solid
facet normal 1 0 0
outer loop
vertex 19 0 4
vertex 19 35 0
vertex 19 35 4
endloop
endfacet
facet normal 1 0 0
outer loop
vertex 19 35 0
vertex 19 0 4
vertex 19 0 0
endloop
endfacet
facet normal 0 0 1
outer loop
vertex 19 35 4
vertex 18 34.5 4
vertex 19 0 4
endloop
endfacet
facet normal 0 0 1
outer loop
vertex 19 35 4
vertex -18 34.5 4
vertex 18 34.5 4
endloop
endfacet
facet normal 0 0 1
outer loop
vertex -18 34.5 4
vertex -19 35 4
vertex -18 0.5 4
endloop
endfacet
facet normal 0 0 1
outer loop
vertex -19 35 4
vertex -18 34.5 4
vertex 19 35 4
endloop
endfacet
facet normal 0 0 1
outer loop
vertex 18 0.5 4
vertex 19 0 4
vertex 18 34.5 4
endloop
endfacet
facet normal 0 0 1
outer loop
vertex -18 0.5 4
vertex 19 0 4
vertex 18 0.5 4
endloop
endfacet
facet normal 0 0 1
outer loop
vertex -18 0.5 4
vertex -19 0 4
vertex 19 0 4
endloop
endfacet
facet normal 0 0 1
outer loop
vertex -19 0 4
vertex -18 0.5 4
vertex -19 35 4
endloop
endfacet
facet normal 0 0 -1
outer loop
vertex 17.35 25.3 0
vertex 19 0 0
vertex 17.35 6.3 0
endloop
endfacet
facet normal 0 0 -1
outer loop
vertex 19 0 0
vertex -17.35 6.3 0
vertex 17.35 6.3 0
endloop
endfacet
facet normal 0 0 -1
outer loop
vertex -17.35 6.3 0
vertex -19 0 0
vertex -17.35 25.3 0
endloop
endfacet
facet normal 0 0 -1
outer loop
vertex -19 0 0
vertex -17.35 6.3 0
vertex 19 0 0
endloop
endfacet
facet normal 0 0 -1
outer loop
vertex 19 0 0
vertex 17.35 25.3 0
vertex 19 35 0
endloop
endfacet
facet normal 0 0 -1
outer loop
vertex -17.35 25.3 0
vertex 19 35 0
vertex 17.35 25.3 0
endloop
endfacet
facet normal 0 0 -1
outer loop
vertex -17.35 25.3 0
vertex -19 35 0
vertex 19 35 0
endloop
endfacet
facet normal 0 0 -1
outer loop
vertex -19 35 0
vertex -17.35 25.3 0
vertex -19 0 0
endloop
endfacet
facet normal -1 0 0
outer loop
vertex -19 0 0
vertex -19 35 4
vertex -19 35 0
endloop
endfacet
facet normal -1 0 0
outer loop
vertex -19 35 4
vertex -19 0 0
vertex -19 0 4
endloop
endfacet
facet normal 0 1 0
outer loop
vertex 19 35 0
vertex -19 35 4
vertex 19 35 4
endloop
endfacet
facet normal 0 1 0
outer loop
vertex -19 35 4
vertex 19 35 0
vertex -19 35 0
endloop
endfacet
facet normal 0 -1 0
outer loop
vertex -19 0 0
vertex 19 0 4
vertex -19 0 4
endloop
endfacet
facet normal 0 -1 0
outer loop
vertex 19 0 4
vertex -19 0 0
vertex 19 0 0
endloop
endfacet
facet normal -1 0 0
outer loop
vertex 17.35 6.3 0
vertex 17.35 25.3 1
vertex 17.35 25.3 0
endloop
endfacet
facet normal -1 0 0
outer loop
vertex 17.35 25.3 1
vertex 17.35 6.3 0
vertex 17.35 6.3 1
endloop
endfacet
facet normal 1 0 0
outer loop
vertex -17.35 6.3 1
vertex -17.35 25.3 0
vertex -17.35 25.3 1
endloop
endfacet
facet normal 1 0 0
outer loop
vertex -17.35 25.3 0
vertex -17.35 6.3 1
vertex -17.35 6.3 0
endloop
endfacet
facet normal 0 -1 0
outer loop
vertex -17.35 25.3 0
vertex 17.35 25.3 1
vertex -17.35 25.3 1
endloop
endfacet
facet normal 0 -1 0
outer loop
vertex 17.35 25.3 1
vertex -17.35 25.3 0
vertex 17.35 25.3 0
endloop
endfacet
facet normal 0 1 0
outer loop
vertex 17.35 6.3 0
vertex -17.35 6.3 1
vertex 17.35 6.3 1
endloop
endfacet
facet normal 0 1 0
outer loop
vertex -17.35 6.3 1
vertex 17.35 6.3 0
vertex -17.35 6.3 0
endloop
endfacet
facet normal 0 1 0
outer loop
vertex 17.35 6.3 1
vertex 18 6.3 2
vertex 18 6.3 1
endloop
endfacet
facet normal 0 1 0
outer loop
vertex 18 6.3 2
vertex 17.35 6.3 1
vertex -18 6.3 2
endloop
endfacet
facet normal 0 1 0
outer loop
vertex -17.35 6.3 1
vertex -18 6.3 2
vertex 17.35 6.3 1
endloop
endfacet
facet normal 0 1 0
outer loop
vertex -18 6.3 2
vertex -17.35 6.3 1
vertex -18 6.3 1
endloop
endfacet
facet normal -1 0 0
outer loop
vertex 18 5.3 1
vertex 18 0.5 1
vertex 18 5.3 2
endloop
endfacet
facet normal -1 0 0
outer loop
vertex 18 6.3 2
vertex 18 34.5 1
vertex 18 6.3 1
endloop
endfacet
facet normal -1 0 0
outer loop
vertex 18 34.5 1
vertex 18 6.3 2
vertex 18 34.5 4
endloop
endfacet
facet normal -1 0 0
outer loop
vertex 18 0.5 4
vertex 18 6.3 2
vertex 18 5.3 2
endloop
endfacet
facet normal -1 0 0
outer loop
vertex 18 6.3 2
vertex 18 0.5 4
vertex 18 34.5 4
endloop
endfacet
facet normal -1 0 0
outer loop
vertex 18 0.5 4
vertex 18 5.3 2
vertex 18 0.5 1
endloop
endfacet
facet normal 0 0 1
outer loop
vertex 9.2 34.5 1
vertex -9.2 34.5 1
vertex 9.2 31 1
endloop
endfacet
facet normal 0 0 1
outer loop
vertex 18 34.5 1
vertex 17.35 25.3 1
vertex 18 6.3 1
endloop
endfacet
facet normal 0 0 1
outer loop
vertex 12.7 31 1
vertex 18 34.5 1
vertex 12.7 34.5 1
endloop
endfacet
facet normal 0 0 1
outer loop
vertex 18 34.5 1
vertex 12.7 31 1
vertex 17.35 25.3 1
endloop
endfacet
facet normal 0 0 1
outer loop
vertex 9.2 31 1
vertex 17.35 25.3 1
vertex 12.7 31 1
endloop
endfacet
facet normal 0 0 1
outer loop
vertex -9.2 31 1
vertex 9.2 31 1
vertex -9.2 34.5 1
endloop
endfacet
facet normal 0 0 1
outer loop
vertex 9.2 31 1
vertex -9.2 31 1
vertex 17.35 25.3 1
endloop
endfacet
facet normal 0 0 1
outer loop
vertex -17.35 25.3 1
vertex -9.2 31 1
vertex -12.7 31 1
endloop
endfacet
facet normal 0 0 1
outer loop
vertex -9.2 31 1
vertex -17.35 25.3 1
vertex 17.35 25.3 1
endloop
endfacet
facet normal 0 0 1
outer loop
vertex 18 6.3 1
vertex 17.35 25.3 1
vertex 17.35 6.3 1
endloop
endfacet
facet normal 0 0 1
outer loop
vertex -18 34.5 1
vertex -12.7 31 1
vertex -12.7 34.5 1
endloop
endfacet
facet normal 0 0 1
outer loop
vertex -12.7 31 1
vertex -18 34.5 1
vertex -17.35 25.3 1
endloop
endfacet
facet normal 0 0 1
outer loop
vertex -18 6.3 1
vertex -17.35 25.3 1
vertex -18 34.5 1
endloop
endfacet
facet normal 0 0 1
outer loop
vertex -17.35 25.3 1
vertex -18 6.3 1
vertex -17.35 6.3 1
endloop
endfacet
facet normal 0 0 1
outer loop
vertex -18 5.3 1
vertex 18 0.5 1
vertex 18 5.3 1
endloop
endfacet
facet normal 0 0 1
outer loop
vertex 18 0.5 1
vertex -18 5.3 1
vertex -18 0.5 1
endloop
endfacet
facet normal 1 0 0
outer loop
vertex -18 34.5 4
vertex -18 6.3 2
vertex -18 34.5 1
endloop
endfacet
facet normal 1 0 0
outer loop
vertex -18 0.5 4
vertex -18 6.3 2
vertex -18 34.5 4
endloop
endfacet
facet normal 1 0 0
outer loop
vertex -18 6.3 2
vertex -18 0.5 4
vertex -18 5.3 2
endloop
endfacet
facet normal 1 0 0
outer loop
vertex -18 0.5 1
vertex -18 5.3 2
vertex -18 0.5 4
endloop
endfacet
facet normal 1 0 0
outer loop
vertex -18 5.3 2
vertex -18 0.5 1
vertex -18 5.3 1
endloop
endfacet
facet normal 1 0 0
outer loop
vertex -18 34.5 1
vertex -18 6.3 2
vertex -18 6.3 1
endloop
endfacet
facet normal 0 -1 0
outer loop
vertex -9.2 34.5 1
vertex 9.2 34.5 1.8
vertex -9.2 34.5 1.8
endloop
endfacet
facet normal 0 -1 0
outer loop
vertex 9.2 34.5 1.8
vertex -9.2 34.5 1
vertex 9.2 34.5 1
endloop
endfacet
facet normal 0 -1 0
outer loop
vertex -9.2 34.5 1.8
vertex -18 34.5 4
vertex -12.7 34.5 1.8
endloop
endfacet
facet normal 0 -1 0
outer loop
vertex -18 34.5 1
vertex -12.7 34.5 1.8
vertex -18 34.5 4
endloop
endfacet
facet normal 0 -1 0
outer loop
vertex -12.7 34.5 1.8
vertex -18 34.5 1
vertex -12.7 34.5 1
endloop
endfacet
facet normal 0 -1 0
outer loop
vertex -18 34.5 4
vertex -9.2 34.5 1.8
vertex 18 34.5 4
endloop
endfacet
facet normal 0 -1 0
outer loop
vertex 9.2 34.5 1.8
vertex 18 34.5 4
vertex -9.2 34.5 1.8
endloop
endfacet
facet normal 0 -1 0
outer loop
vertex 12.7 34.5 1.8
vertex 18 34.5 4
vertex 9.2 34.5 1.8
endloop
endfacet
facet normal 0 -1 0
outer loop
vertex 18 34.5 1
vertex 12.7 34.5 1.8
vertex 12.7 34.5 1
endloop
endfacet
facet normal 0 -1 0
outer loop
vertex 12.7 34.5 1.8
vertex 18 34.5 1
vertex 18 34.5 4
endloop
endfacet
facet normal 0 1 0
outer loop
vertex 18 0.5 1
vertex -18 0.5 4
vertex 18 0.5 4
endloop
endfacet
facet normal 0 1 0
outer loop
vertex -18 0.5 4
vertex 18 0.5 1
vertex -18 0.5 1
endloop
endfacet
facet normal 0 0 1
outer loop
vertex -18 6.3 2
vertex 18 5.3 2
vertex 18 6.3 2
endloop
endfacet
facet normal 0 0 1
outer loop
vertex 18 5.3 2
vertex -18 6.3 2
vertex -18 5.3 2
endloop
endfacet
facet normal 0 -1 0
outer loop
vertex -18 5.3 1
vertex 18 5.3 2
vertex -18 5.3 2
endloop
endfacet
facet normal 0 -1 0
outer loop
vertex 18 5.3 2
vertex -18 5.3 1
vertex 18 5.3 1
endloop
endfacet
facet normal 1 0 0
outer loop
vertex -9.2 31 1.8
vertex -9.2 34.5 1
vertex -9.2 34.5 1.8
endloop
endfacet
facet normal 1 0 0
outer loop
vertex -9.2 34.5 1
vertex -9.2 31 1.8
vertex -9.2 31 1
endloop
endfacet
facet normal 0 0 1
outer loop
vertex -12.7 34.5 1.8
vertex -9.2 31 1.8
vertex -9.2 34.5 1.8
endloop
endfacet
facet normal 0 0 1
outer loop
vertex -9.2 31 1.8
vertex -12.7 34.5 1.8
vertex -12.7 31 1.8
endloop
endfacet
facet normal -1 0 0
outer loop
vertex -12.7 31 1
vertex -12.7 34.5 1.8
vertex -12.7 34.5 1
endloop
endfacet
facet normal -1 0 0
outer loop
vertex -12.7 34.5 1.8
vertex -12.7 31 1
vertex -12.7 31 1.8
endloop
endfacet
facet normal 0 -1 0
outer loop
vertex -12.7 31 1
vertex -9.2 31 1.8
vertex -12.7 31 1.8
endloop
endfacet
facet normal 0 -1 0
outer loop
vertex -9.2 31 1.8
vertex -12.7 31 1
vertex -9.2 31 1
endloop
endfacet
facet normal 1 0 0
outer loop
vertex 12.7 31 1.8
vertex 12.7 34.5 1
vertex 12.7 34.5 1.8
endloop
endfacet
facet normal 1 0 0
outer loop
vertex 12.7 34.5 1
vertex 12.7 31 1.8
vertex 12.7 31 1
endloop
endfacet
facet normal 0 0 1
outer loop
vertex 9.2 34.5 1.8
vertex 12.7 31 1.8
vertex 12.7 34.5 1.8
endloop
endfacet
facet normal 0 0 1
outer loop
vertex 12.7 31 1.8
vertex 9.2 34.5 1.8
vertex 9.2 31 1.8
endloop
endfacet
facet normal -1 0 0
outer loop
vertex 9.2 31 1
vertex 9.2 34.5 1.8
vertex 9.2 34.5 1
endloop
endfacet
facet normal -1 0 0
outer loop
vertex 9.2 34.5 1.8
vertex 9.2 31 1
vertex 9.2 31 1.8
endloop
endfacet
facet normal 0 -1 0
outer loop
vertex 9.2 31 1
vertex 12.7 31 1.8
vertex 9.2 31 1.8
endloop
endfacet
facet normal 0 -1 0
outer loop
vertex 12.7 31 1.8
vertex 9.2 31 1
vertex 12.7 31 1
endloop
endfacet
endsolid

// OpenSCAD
module display_cutout() {
    translate([-38/2,0,0])
    difference() {
        cube([38, 35, 4]);
    }
}

module display() {
    translate([-38/2,0,0]) {
        union() {
            difference() {
                cube([38, 35, 4]);

                // display cutout
                translate([(38 - 34.7) / 2, 6.3, 0])
                    cube([34.7, 19, 5]);

                translate([(38 - 36) / 2, (35 - 34) / 2, 1])
                    cube([36, 34, 5]);
            }

            steg_d = 1;
            translate([0, 6.3 - steg_d, 0])
                cube([38, steg_d, 2]);

            translate([6.3, 35 - 4, 0])
                cube([3.5, 4, 1.8]);

            translate([38 - 6.3 - 3.5, 35 - 4, 0])
                cube([3.5, 4, 1.8]);
        }
    }
}

display();
